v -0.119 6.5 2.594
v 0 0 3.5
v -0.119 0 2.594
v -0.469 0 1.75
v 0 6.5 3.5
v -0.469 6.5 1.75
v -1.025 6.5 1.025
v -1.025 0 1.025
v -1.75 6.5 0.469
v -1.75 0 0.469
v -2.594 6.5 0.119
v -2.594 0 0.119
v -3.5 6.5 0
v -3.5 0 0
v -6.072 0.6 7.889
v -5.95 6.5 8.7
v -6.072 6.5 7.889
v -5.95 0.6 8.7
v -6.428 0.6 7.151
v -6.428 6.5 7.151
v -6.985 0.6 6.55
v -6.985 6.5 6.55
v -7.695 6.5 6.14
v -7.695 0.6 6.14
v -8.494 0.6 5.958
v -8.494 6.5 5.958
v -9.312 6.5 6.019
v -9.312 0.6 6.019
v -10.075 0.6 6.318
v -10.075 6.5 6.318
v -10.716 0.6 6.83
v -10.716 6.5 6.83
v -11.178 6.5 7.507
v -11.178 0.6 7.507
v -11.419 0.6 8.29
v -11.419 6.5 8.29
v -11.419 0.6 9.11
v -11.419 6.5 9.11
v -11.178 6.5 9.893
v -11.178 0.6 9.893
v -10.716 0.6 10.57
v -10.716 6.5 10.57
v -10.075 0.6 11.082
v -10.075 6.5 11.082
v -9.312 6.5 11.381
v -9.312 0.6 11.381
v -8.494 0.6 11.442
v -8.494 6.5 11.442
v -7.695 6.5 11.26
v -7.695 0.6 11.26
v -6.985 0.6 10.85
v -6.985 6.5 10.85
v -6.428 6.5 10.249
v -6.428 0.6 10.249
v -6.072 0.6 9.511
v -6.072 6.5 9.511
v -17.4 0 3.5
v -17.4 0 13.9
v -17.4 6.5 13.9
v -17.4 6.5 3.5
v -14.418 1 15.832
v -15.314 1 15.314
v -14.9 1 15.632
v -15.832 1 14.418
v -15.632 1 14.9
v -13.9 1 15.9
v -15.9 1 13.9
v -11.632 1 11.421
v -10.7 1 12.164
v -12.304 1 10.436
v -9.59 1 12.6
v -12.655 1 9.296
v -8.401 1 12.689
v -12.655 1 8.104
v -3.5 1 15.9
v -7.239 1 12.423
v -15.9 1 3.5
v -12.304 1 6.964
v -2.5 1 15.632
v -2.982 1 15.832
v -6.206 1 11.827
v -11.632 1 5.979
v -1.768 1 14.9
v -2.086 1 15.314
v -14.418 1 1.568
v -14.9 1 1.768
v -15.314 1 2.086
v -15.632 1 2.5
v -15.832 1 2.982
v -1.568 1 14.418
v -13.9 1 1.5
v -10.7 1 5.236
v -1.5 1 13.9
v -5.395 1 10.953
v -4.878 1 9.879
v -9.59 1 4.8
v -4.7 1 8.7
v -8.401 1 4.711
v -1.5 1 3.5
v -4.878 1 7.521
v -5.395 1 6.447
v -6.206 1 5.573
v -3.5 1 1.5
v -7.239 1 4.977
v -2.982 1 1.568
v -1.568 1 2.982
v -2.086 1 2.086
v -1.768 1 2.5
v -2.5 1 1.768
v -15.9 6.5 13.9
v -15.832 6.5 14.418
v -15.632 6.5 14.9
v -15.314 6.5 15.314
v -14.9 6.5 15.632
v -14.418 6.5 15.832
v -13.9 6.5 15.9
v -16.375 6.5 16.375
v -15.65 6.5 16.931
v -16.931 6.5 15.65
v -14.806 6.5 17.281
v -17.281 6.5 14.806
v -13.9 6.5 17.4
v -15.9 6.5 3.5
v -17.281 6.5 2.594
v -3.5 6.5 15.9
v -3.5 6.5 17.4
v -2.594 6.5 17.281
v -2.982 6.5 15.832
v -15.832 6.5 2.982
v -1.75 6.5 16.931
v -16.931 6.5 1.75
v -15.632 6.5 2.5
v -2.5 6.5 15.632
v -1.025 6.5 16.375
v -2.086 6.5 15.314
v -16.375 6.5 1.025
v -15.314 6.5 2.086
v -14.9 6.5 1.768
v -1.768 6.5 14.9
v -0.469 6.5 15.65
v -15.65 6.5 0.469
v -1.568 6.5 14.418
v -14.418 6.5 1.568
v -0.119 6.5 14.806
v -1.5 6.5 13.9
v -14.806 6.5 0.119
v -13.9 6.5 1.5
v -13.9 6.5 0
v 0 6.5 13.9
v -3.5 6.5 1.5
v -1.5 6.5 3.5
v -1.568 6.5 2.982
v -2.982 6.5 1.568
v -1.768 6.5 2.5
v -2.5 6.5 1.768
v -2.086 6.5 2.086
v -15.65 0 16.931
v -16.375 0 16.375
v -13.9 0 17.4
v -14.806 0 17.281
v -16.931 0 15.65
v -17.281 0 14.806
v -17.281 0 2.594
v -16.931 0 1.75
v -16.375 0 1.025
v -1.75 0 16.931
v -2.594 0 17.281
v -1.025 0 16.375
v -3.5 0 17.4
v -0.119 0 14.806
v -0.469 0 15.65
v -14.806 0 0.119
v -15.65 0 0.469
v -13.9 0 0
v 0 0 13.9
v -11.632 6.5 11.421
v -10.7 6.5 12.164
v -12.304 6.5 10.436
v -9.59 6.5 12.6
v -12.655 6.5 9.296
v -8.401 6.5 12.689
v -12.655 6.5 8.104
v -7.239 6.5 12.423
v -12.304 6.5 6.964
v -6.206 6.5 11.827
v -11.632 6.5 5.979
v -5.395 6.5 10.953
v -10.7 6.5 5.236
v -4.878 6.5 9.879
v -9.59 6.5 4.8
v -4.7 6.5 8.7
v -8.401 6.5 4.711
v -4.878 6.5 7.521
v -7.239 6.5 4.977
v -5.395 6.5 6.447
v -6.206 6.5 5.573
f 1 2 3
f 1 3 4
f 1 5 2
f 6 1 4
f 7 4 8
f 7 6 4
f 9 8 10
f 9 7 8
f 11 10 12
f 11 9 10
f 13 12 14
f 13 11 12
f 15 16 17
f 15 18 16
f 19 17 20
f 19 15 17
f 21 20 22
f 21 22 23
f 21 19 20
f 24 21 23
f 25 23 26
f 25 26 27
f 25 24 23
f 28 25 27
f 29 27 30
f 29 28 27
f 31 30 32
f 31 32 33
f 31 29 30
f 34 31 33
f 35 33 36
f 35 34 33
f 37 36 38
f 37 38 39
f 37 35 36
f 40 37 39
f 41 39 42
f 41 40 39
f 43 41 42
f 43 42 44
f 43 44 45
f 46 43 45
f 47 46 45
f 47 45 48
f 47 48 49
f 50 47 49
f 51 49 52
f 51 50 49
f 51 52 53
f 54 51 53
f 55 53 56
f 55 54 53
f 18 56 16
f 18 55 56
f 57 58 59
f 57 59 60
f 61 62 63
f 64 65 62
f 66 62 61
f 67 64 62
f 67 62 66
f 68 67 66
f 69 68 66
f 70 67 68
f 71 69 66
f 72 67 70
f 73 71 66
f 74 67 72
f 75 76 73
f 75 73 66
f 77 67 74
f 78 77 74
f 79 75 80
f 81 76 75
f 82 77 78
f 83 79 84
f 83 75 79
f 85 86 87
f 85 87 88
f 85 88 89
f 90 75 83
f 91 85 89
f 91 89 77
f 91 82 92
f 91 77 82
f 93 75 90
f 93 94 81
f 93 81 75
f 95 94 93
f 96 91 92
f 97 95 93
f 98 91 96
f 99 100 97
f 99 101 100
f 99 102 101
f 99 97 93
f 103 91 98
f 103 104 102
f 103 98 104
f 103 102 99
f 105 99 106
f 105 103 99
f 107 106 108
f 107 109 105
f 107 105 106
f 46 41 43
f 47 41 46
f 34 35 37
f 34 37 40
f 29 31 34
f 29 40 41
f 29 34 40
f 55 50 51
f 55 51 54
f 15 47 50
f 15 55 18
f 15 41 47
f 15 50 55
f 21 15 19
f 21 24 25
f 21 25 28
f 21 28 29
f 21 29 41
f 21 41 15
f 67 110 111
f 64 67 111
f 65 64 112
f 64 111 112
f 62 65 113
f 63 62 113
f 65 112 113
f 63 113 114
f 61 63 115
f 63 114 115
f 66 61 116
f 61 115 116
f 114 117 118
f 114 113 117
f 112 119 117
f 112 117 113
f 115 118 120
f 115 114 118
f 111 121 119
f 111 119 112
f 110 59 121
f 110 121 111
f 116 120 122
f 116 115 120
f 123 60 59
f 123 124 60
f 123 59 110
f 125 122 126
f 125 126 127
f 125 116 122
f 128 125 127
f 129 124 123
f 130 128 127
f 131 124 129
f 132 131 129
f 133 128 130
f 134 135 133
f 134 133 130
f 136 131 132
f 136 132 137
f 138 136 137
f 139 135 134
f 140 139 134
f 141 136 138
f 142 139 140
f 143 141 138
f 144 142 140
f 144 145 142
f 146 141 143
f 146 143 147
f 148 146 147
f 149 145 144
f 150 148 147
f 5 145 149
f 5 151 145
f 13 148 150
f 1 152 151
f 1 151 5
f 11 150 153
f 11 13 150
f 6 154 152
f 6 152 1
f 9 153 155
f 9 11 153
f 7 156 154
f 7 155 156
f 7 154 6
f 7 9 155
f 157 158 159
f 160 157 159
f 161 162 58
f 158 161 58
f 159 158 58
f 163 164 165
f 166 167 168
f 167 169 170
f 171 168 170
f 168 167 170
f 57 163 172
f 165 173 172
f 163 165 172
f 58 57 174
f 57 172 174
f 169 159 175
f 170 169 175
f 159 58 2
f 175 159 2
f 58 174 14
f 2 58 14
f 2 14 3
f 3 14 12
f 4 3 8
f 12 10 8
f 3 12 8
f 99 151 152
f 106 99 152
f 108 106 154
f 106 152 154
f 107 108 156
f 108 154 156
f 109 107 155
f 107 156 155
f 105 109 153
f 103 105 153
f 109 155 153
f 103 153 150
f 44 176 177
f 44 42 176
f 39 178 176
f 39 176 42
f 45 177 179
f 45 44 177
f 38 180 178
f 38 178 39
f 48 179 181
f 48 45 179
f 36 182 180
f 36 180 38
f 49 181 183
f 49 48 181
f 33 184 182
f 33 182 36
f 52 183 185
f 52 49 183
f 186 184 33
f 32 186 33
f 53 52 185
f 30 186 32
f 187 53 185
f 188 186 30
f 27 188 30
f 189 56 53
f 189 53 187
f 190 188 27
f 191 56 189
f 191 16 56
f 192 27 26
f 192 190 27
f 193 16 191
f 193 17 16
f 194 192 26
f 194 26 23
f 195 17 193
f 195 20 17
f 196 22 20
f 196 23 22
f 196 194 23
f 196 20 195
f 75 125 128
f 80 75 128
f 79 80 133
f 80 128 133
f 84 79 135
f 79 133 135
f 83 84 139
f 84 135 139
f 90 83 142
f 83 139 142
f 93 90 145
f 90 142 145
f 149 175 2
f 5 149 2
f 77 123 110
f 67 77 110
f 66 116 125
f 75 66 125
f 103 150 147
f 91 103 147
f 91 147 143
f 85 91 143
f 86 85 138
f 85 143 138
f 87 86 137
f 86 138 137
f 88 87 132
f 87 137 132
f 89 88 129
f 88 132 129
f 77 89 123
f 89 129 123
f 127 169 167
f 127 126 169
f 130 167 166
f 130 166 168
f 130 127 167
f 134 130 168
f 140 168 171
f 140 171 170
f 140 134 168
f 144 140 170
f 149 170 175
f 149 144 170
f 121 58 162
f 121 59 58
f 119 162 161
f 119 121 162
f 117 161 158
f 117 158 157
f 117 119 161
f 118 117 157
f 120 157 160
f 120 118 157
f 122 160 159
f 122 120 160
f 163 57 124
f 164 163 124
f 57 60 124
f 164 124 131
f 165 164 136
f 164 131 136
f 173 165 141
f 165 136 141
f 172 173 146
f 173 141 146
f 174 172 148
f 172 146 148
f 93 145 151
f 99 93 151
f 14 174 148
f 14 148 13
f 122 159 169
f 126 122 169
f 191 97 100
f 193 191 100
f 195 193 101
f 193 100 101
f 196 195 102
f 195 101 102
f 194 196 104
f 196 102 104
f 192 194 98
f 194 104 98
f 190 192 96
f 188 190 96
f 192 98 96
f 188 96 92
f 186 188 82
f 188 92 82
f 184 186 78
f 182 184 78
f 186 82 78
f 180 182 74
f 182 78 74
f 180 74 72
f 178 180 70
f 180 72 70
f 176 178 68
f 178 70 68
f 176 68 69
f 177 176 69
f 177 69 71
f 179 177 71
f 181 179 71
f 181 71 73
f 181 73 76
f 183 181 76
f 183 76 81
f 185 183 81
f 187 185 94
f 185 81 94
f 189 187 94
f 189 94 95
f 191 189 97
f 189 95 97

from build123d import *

# Parameters (mm, degrees)
SKETCH1_W           = 17.4
SKETCH1_H           = 17.4
BOSS_EXTRUDE1_DEPTH = 6.5
FILLET1_R           = 3.5
CUT_EXTRUDE1_DEPTH  = 5.5
SKETCH3_R           = 4
SKETCH3_R_2         = 2.75
BOSS_EXTRUDE2_DEPTH = 5.5
SKETCH4_R           = 2.75
CUT_EXTRUDE2_DEPTH  = 0.4


with BuildPart() as part:
    # Sketch1 → Boss-Extrude1 (new body)
    with BuildSketch(Plane(origin=(0, 0, 0), x_dir=(1, 0, 0), z_dir=(0, 1, 0))):
        with Locations((-8.7, -8.7)):
            Rectangle(SKETCH1_W, SKETCH1_H)
    extrude(amount=BOSS_EXTRUDE1_DEPTH)

    # Fillet1
    fillet1_edges = [part.edges().sort_by_distance(p)[0] for p in [
        (0, 3.25, 17.4),
        (-17.4, 3.25, 17.4),
        (-17.4, 3.25, 0),
        (0, 3.25, 0),
    ]]
    fillet(fillet1_edges, radius=FILLET1_R)

    # Sketch2 → Cut-Extrude1 (cut)
    with BuildSketch(Plane(origin=(0, 6.5, 0), x_dir=(1, 0, 0), z_dir=(0, 1, 0))):
        with BuildLine():
            Line((-13.9, -15.9), (-3.5, -15.9))
            ThreePointArc((-3.5, -15.9), (-2.085786438, -15.314213562), (-1.5, -13.9))
            Line((-1.5, -13.9), (-1.5, -3.5))
            ThreePointArc((-1.5, -3.5), (-2.085786438, -2.085786438), (-3.5, -1.5))
            Line((-3.5, -1.5), (-13.9, -1.5))
            ThreePointArc((-13.9, -1.5), (-15.314213562, -2.085786438), (-15.9, -3.5))
            Line((-15.9, -3.5), (-15.9, -13.9))
            ThreePointArc((-15.9, -13.9), (-15.314213562, -15.314213562), (-13.9, -15.9))
        make_face()
    extrude(amount=-CUT_EXTRUDE1_DEPTH, mode=Mode.SUBTRACT)

    # Sketch3 → Boss-Extrude2 (add)
    with BuildSketch(Plane(origin=(0, 1, 0), x_dir=(1, 0, 0), z_dir=(0, 1, 0))):
        with Locations((-8.7, -8.7)):
            Circle(SKETCH3_R)
        with Locations((-8.7, -8.7)):
            Circle(SKETCH3_R_2, mode=Mode.SUBTRACT)
    extrude(amount=BOSS_EXTRUDE2_DEPTH)

    # Sketch4 → Cut-Extrude2 (cut)
    with BuildSketch(Plane(origin=(0, 1, 0), x_dir=(1, 0, 0), z_dir=(0, 1, 0))):
        with Locations((-8.7, -8.7)):
            Circle(SKETCH4_R)
    extrude(amount=-CUT_EXTRUDE2_DEPTH, mode=Mode.SUBTRACT)


solid = part.part
